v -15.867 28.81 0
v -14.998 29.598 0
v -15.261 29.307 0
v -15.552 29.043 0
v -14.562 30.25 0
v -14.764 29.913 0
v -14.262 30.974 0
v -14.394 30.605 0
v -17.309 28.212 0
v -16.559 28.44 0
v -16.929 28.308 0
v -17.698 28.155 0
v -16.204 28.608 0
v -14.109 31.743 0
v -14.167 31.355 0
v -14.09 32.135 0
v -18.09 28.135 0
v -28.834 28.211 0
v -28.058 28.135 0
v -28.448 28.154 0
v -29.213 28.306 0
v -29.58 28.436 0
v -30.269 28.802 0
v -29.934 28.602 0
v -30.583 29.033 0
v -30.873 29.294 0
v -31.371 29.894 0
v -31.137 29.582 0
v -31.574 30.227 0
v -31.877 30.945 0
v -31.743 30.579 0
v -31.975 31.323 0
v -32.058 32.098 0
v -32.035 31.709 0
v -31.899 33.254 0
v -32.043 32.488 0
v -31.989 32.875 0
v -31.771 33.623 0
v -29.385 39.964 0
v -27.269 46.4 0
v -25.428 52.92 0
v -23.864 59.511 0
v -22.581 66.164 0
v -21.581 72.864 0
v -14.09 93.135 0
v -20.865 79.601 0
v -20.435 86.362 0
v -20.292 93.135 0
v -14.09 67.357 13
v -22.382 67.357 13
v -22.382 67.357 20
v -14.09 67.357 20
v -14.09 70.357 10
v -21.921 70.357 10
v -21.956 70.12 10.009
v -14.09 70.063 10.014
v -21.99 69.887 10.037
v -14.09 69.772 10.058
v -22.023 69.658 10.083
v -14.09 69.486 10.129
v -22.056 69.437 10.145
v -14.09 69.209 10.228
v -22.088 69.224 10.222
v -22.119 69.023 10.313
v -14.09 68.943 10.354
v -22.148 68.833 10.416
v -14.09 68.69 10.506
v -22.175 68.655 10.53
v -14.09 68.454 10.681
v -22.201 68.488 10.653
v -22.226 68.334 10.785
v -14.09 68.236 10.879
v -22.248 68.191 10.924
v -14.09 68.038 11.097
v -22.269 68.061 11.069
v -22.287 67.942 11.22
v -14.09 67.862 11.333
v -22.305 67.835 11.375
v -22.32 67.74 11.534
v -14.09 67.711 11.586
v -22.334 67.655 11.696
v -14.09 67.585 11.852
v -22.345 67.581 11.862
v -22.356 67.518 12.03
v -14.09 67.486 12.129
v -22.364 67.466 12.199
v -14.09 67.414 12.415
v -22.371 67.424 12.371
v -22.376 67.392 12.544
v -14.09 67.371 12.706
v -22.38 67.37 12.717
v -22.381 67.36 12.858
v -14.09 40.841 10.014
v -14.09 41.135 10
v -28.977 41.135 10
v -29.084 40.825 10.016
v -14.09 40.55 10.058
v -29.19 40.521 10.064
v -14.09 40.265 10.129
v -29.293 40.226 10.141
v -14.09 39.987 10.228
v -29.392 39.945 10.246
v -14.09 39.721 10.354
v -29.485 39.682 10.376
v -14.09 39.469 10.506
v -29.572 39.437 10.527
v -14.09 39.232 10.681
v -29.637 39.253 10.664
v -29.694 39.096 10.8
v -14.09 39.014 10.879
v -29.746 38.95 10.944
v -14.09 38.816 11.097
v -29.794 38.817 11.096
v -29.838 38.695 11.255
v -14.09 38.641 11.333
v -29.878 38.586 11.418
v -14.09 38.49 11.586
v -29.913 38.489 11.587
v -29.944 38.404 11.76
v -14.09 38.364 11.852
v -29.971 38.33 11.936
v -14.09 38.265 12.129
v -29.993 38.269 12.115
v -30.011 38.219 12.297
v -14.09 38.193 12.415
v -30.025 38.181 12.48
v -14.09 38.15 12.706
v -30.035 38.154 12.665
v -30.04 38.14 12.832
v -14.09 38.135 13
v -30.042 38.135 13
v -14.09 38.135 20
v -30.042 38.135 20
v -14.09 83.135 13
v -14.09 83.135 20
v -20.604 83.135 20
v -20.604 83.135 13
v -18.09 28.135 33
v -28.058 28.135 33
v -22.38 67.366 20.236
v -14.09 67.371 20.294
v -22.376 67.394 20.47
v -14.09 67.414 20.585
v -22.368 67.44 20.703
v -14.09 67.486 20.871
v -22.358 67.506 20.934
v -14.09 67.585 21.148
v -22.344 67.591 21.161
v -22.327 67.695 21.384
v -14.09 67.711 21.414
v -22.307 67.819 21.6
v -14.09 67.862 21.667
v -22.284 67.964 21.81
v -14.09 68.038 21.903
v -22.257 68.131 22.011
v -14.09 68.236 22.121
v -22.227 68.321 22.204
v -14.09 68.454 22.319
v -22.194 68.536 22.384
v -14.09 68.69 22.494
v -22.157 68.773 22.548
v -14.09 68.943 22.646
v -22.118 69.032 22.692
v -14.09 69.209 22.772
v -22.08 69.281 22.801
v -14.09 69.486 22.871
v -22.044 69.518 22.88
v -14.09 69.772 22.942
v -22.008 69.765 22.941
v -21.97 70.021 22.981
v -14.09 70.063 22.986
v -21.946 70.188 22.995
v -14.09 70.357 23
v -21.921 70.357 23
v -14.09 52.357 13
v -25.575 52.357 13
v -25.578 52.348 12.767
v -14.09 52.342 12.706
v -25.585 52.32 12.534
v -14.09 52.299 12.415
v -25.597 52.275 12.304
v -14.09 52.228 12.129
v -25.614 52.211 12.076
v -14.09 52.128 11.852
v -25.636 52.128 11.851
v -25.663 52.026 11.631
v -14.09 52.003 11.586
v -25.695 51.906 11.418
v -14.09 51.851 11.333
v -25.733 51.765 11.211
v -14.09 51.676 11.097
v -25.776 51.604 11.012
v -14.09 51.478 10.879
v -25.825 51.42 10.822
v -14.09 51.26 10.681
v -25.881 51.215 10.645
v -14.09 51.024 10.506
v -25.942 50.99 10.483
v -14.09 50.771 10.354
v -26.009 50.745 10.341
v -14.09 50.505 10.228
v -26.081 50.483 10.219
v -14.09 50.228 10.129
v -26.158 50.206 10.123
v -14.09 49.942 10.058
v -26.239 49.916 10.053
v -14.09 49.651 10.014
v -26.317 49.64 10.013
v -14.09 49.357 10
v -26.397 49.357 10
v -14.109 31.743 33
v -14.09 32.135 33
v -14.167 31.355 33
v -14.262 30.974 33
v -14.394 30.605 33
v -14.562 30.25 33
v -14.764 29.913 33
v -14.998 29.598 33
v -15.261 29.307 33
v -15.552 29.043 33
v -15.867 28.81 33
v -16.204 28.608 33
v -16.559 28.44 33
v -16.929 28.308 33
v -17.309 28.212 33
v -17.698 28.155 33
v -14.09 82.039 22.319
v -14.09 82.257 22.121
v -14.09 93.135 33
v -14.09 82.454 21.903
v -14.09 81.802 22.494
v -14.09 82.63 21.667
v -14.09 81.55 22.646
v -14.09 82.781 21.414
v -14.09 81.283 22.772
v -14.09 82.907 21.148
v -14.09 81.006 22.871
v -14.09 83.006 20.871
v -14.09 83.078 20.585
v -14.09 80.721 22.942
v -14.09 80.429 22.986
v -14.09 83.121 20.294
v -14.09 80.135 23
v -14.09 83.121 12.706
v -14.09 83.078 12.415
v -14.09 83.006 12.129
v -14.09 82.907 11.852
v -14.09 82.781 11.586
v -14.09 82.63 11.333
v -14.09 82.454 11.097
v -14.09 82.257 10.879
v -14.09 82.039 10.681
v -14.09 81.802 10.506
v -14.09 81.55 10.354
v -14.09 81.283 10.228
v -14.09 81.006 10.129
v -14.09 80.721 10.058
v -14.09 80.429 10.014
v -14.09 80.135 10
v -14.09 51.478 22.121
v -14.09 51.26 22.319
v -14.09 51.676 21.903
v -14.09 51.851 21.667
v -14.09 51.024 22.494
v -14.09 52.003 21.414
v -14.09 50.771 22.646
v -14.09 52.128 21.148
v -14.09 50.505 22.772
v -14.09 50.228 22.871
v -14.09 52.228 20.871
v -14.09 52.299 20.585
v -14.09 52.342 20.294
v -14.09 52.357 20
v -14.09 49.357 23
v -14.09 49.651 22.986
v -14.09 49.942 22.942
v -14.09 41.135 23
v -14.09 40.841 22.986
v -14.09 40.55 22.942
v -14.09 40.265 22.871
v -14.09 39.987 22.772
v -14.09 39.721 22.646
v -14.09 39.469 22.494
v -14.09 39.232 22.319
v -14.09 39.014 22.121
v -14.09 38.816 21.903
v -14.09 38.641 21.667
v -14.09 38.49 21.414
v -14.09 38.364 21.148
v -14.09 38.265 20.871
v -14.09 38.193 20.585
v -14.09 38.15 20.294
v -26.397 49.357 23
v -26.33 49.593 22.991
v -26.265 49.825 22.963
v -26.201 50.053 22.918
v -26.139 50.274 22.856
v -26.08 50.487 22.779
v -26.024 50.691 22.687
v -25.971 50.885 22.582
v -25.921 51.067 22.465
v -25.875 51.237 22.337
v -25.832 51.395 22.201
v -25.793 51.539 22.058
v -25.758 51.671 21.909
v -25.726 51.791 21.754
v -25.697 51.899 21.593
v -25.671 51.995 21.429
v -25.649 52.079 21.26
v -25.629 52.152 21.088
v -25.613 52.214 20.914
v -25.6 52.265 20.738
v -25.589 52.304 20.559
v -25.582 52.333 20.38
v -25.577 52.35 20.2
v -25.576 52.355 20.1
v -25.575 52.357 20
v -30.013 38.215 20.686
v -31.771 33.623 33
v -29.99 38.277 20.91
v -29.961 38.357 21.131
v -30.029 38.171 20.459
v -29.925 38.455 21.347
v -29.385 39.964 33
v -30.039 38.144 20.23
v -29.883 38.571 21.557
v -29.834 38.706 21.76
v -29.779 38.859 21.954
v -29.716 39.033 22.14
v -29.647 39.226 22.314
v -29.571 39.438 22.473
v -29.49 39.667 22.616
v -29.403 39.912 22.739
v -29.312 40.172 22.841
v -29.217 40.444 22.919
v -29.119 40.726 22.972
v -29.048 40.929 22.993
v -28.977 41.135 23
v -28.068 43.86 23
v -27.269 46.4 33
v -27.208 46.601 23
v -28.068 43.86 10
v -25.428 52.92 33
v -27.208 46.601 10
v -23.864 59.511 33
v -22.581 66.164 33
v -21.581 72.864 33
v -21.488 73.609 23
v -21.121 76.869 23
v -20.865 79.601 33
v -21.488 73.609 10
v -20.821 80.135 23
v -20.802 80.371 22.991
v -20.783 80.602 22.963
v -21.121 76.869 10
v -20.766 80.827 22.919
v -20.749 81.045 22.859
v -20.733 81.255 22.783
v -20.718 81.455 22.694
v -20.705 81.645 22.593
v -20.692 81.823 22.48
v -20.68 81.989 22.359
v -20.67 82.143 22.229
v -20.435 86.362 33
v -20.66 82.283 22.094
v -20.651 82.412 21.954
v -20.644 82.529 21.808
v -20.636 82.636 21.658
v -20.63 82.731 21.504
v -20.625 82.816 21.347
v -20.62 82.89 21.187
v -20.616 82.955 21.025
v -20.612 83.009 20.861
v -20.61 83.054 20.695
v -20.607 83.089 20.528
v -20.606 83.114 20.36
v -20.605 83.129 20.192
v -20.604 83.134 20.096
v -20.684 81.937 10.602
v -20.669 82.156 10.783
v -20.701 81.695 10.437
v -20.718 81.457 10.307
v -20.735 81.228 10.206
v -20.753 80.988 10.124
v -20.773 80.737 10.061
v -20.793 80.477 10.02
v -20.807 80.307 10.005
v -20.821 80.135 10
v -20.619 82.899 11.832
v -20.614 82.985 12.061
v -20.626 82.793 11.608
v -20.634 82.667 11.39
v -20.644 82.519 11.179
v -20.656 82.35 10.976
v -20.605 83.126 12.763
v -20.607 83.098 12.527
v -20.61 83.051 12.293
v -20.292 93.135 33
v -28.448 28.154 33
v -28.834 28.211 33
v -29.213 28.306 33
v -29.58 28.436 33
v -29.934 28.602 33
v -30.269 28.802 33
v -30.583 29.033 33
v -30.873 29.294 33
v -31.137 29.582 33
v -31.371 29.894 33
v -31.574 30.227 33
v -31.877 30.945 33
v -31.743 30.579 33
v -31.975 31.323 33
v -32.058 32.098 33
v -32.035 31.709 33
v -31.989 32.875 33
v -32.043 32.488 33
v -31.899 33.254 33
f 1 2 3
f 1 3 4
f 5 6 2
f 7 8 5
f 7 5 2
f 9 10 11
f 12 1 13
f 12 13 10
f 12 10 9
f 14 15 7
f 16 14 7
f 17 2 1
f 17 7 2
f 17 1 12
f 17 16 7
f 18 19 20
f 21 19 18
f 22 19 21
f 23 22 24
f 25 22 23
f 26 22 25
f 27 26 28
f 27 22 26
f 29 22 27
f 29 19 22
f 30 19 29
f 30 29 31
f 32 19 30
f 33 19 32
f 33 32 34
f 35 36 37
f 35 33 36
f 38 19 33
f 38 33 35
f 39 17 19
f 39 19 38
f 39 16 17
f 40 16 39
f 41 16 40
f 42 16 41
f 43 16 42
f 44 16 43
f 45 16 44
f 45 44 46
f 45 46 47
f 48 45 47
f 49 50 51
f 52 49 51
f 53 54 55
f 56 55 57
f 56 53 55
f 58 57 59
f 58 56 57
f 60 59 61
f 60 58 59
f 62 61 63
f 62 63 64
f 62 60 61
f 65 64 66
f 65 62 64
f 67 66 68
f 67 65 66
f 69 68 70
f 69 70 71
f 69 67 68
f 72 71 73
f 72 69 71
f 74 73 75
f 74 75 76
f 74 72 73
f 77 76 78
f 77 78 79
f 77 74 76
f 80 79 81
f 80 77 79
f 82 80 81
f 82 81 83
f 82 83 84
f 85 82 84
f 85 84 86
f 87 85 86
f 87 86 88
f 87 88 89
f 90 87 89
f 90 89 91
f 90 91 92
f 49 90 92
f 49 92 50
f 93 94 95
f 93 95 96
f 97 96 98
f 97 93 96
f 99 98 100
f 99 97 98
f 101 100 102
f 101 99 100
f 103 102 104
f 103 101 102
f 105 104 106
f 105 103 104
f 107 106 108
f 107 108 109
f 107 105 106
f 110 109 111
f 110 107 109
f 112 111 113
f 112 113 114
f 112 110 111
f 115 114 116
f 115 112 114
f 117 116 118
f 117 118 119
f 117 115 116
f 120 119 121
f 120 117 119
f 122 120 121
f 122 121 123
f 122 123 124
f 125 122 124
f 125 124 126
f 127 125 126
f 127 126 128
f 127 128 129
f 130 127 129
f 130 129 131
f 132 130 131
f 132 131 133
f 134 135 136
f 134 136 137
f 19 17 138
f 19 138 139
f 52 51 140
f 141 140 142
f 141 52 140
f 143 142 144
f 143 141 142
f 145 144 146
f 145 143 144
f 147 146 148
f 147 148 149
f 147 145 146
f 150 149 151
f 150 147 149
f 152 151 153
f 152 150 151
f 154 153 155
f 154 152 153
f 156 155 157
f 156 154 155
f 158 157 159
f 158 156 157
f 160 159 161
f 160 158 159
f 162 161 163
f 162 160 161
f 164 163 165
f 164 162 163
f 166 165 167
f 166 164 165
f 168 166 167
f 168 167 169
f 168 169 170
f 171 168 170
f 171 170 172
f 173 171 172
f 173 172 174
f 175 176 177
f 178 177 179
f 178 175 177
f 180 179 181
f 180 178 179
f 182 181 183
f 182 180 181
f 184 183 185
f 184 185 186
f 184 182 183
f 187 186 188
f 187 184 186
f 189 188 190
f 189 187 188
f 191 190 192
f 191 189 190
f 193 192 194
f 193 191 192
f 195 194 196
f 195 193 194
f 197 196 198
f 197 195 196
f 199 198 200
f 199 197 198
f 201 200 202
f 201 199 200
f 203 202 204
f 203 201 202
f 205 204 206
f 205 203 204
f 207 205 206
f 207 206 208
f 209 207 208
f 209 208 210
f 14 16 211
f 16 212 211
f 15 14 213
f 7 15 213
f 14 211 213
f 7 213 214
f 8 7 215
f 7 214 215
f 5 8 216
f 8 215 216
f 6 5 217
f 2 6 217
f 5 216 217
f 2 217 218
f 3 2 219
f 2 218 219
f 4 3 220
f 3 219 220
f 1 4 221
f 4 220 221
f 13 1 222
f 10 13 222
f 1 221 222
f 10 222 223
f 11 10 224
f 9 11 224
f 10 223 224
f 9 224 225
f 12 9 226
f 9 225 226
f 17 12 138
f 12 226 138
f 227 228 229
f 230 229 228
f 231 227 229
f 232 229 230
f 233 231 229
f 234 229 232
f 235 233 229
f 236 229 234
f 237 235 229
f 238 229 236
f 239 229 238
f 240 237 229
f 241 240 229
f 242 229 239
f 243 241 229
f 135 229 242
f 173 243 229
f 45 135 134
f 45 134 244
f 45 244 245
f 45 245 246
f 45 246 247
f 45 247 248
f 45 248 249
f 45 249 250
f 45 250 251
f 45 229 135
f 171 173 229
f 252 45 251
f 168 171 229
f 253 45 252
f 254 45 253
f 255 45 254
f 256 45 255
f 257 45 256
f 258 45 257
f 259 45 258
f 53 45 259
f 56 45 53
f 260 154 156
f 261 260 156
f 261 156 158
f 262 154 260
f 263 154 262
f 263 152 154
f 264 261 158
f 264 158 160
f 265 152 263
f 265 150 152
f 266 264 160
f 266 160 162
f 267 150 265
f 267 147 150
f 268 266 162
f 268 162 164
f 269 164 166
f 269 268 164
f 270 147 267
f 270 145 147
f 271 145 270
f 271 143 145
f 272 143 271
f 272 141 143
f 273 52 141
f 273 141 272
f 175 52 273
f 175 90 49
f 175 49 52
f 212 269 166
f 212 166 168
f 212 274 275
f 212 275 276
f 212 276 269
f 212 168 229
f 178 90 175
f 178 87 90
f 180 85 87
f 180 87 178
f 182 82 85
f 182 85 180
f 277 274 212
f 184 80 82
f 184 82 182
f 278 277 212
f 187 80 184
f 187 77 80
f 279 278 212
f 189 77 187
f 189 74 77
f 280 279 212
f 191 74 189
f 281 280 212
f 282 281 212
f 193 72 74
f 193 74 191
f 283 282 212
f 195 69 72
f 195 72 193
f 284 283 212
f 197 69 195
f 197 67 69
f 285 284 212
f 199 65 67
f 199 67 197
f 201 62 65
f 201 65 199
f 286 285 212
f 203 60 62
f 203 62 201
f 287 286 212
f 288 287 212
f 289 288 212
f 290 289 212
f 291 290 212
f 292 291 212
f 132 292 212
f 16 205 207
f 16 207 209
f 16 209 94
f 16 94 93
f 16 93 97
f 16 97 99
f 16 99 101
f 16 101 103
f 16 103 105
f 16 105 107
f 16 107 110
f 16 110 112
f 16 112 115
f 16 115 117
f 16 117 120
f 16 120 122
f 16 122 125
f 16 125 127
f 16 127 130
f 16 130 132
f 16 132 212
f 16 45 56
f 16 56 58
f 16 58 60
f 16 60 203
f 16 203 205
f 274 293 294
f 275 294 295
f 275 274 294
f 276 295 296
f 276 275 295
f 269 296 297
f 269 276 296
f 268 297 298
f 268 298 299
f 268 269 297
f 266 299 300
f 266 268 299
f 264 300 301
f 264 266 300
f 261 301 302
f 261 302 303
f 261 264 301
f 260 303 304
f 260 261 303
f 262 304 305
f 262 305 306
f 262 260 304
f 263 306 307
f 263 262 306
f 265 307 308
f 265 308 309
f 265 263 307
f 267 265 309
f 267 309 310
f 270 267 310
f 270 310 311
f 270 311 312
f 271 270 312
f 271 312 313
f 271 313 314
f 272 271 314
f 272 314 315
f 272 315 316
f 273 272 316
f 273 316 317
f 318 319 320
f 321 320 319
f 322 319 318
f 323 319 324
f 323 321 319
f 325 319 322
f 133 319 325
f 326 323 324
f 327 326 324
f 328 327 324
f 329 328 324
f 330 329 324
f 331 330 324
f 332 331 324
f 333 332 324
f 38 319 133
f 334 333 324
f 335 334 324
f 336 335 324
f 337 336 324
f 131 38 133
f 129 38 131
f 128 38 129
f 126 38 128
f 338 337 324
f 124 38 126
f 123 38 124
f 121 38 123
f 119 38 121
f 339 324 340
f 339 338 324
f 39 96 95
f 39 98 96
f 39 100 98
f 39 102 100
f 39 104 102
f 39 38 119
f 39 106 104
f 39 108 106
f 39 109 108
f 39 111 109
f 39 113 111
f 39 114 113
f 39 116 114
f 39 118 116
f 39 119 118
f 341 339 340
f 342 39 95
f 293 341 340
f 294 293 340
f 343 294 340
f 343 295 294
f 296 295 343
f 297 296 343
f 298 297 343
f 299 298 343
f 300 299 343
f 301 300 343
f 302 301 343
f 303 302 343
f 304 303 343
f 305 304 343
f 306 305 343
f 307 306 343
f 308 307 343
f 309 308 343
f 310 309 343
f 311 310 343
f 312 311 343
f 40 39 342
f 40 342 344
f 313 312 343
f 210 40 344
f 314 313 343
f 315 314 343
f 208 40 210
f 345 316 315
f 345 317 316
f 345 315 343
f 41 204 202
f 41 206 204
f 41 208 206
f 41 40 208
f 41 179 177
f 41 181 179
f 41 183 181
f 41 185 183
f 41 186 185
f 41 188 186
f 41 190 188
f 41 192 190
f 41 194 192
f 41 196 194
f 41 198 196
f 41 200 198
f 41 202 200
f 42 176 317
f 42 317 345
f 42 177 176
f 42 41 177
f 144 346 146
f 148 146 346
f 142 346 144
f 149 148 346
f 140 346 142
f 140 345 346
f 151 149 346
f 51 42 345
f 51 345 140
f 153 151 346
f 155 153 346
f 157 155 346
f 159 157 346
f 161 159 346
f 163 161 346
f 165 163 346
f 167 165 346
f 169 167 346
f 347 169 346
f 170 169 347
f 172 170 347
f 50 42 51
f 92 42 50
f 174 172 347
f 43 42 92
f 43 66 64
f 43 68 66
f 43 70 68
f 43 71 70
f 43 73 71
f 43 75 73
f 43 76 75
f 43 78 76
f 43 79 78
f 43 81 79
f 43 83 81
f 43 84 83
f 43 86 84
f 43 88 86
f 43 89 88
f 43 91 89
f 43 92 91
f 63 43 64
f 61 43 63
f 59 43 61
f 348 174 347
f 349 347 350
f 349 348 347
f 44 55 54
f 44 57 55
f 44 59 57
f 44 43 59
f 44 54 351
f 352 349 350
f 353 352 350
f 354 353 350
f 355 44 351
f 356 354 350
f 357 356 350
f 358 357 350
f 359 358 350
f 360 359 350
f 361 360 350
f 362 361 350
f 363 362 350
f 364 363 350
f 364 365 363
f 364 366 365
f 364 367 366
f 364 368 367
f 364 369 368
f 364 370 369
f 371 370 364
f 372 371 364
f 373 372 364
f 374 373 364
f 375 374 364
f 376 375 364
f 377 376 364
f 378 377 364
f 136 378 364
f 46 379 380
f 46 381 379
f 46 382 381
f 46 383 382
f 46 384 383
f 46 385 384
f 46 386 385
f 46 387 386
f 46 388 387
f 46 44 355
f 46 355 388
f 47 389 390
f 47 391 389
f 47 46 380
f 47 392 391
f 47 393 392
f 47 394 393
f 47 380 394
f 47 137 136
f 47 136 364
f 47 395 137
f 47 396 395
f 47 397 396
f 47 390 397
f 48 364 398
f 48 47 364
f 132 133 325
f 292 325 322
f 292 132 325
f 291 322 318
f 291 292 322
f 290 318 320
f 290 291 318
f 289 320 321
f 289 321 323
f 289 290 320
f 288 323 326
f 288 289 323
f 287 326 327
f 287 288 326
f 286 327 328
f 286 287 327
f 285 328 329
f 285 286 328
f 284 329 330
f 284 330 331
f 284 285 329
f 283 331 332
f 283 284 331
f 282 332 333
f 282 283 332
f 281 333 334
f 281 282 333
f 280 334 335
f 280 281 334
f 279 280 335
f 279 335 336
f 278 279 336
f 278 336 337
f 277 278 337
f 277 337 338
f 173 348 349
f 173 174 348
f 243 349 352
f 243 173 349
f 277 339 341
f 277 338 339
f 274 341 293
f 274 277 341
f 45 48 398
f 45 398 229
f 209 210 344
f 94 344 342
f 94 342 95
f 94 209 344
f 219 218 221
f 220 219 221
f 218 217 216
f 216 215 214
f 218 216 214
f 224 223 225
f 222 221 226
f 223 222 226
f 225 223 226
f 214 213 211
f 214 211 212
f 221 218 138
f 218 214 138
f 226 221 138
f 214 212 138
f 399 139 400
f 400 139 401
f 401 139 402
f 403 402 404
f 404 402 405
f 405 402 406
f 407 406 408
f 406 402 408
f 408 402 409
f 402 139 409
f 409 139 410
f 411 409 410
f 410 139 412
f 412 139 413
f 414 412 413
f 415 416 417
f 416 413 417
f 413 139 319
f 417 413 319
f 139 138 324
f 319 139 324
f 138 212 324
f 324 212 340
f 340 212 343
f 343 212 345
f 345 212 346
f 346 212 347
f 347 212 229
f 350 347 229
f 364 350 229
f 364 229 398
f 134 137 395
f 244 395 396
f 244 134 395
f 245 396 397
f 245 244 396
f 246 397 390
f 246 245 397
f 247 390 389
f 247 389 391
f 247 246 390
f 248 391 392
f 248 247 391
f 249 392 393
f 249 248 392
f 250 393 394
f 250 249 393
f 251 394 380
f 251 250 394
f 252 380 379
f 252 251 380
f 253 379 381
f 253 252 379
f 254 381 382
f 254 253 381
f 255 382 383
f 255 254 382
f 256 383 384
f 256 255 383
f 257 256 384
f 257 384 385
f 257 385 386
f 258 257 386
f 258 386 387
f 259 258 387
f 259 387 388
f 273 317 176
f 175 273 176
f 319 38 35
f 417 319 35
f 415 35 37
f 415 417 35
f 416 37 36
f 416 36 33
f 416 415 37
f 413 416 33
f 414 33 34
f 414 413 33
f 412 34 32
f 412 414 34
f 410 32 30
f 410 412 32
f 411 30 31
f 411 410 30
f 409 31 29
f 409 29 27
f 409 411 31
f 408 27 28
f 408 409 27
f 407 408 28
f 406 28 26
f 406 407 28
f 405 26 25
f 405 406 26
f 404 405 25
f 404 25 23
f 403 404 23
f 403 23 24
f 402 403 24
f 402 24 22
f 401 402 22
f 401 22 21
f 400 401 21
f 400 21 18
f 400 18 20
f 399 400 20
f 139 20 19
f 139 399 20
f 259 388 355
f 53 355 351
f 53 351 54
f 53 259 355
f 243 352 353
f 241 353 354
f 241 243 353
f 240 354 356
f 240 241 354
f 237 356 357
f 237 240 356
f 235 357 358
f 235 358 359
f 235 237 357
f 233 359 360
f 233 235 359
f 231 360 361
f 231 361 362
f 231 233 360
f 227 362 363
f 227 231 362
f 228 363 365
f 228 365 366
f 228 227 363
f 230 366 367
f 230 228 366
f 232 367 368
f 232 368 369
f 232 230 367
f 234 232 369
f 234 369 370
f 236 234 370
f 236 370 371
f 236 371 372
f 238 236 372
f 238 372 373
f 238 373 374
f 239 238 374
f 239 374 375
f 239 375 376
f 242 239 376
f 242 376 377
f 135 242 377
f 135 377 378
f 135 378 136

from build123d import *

# Parameters (mm, degrees)
RESSALTO_EXTRUS_O1_DEPTH = 33
CORTE_EXTRUS_O1_DEPTH    = 33
FILETE1_R                = 4


with BuildPart() as part:
    # Esboço1 → Ressalto-extrusão1 (new body)
    with BuildSketch(Plane.XY):
        with BuildLine():
            Line((-20.29157915, 93.135393664), (-14.089663978, 93.135393664))
            Line((-14.089663978, 93.135393664), (-14.089663978, 28.135393664))
            Line((-14.089663978, 28.135393664), (-34.089663978, 28.135393664))
            ThreePointArc((-34.089663978, 28.135393664), (-23.779109315, 59.911203888), (-20.29157915, 93.135393664))
        make_face()
    extrude(amount=RESSALTO_EXTRUS_O1_DEPTH)

    # Esboço2 → Corte-extrusão1 (cut)
    with BuildSketch(Plane(origin=(-14.089663978, 0, 0), x_dir=(0, 0, -1), z_dir=(1, 0, 0))):
        with BuildLine():
            Line((-20, 83.135393664), (-13, 83.135393664))
            ThreePointArc((-13, 83.135393664), (-10.878679656, 82.256714007), (-10, 80.135393664))
            Line((-10, 80.135393664), (-10, 70.356838266))
            ThreePointArc((-10, 70.356838266), (-10.878679656, 68.235517922), (-13, 67.356838266))
            Line((-13, 67.356838266), (-20, 67.356838266))
            ThreePointArc((-20, 67.356838266), (-22.121320344, 68.235517922), (-23, 70.356838266))
            Line((-23, 70.356838266), (-23, 80.135393664))
            ThreePointArc((-23, 80.135393664), (-22.121320344, 82.256714007), (-20, 83.135393664))
        make_face()
        with BuildLine():
            Line((-20, 52.356838266), (-13, 52.356838266))
            ThreePointArc((-13, 52.356838266), (-10.878679656, 51.478158609), (-10, 49.356838266))
            Line((-10, 49.356838266), (-10, 41.135393664))
            ThreePointArc((-10, 41.135393664), (-10.878679656, 39.01407332), (-13, 38.135393664))
            Line((-13, 38.135393664), (-20, 38.135393664))
            ThreePointArc((-20, 38.135393664), (-22.121320344, 39.01407332), (-23, 41.135393664))
            Line((-23, 41.135393664), (-23, 49.356838266))
            ThreePointArc((-23, 49.356838266), (-22.121320344, 51.478158609), (-20, 52.356838266))
        make_face()
    extrude(amount=-CORTE_EXTRUS_O1_DEPTH, mode=Mode.SUBTRACT)

    # Filete1
    filete1_edges = [part.edges().sort_by_distance(p)[0] for p in [
        (-14.089663978, 28.135393664, 16.5),
        (-34.089663978, 28.135393664, 16.5),
    ]]
    fillet(filete1_edges, radius=FILETE1_R)


solid = part.part
